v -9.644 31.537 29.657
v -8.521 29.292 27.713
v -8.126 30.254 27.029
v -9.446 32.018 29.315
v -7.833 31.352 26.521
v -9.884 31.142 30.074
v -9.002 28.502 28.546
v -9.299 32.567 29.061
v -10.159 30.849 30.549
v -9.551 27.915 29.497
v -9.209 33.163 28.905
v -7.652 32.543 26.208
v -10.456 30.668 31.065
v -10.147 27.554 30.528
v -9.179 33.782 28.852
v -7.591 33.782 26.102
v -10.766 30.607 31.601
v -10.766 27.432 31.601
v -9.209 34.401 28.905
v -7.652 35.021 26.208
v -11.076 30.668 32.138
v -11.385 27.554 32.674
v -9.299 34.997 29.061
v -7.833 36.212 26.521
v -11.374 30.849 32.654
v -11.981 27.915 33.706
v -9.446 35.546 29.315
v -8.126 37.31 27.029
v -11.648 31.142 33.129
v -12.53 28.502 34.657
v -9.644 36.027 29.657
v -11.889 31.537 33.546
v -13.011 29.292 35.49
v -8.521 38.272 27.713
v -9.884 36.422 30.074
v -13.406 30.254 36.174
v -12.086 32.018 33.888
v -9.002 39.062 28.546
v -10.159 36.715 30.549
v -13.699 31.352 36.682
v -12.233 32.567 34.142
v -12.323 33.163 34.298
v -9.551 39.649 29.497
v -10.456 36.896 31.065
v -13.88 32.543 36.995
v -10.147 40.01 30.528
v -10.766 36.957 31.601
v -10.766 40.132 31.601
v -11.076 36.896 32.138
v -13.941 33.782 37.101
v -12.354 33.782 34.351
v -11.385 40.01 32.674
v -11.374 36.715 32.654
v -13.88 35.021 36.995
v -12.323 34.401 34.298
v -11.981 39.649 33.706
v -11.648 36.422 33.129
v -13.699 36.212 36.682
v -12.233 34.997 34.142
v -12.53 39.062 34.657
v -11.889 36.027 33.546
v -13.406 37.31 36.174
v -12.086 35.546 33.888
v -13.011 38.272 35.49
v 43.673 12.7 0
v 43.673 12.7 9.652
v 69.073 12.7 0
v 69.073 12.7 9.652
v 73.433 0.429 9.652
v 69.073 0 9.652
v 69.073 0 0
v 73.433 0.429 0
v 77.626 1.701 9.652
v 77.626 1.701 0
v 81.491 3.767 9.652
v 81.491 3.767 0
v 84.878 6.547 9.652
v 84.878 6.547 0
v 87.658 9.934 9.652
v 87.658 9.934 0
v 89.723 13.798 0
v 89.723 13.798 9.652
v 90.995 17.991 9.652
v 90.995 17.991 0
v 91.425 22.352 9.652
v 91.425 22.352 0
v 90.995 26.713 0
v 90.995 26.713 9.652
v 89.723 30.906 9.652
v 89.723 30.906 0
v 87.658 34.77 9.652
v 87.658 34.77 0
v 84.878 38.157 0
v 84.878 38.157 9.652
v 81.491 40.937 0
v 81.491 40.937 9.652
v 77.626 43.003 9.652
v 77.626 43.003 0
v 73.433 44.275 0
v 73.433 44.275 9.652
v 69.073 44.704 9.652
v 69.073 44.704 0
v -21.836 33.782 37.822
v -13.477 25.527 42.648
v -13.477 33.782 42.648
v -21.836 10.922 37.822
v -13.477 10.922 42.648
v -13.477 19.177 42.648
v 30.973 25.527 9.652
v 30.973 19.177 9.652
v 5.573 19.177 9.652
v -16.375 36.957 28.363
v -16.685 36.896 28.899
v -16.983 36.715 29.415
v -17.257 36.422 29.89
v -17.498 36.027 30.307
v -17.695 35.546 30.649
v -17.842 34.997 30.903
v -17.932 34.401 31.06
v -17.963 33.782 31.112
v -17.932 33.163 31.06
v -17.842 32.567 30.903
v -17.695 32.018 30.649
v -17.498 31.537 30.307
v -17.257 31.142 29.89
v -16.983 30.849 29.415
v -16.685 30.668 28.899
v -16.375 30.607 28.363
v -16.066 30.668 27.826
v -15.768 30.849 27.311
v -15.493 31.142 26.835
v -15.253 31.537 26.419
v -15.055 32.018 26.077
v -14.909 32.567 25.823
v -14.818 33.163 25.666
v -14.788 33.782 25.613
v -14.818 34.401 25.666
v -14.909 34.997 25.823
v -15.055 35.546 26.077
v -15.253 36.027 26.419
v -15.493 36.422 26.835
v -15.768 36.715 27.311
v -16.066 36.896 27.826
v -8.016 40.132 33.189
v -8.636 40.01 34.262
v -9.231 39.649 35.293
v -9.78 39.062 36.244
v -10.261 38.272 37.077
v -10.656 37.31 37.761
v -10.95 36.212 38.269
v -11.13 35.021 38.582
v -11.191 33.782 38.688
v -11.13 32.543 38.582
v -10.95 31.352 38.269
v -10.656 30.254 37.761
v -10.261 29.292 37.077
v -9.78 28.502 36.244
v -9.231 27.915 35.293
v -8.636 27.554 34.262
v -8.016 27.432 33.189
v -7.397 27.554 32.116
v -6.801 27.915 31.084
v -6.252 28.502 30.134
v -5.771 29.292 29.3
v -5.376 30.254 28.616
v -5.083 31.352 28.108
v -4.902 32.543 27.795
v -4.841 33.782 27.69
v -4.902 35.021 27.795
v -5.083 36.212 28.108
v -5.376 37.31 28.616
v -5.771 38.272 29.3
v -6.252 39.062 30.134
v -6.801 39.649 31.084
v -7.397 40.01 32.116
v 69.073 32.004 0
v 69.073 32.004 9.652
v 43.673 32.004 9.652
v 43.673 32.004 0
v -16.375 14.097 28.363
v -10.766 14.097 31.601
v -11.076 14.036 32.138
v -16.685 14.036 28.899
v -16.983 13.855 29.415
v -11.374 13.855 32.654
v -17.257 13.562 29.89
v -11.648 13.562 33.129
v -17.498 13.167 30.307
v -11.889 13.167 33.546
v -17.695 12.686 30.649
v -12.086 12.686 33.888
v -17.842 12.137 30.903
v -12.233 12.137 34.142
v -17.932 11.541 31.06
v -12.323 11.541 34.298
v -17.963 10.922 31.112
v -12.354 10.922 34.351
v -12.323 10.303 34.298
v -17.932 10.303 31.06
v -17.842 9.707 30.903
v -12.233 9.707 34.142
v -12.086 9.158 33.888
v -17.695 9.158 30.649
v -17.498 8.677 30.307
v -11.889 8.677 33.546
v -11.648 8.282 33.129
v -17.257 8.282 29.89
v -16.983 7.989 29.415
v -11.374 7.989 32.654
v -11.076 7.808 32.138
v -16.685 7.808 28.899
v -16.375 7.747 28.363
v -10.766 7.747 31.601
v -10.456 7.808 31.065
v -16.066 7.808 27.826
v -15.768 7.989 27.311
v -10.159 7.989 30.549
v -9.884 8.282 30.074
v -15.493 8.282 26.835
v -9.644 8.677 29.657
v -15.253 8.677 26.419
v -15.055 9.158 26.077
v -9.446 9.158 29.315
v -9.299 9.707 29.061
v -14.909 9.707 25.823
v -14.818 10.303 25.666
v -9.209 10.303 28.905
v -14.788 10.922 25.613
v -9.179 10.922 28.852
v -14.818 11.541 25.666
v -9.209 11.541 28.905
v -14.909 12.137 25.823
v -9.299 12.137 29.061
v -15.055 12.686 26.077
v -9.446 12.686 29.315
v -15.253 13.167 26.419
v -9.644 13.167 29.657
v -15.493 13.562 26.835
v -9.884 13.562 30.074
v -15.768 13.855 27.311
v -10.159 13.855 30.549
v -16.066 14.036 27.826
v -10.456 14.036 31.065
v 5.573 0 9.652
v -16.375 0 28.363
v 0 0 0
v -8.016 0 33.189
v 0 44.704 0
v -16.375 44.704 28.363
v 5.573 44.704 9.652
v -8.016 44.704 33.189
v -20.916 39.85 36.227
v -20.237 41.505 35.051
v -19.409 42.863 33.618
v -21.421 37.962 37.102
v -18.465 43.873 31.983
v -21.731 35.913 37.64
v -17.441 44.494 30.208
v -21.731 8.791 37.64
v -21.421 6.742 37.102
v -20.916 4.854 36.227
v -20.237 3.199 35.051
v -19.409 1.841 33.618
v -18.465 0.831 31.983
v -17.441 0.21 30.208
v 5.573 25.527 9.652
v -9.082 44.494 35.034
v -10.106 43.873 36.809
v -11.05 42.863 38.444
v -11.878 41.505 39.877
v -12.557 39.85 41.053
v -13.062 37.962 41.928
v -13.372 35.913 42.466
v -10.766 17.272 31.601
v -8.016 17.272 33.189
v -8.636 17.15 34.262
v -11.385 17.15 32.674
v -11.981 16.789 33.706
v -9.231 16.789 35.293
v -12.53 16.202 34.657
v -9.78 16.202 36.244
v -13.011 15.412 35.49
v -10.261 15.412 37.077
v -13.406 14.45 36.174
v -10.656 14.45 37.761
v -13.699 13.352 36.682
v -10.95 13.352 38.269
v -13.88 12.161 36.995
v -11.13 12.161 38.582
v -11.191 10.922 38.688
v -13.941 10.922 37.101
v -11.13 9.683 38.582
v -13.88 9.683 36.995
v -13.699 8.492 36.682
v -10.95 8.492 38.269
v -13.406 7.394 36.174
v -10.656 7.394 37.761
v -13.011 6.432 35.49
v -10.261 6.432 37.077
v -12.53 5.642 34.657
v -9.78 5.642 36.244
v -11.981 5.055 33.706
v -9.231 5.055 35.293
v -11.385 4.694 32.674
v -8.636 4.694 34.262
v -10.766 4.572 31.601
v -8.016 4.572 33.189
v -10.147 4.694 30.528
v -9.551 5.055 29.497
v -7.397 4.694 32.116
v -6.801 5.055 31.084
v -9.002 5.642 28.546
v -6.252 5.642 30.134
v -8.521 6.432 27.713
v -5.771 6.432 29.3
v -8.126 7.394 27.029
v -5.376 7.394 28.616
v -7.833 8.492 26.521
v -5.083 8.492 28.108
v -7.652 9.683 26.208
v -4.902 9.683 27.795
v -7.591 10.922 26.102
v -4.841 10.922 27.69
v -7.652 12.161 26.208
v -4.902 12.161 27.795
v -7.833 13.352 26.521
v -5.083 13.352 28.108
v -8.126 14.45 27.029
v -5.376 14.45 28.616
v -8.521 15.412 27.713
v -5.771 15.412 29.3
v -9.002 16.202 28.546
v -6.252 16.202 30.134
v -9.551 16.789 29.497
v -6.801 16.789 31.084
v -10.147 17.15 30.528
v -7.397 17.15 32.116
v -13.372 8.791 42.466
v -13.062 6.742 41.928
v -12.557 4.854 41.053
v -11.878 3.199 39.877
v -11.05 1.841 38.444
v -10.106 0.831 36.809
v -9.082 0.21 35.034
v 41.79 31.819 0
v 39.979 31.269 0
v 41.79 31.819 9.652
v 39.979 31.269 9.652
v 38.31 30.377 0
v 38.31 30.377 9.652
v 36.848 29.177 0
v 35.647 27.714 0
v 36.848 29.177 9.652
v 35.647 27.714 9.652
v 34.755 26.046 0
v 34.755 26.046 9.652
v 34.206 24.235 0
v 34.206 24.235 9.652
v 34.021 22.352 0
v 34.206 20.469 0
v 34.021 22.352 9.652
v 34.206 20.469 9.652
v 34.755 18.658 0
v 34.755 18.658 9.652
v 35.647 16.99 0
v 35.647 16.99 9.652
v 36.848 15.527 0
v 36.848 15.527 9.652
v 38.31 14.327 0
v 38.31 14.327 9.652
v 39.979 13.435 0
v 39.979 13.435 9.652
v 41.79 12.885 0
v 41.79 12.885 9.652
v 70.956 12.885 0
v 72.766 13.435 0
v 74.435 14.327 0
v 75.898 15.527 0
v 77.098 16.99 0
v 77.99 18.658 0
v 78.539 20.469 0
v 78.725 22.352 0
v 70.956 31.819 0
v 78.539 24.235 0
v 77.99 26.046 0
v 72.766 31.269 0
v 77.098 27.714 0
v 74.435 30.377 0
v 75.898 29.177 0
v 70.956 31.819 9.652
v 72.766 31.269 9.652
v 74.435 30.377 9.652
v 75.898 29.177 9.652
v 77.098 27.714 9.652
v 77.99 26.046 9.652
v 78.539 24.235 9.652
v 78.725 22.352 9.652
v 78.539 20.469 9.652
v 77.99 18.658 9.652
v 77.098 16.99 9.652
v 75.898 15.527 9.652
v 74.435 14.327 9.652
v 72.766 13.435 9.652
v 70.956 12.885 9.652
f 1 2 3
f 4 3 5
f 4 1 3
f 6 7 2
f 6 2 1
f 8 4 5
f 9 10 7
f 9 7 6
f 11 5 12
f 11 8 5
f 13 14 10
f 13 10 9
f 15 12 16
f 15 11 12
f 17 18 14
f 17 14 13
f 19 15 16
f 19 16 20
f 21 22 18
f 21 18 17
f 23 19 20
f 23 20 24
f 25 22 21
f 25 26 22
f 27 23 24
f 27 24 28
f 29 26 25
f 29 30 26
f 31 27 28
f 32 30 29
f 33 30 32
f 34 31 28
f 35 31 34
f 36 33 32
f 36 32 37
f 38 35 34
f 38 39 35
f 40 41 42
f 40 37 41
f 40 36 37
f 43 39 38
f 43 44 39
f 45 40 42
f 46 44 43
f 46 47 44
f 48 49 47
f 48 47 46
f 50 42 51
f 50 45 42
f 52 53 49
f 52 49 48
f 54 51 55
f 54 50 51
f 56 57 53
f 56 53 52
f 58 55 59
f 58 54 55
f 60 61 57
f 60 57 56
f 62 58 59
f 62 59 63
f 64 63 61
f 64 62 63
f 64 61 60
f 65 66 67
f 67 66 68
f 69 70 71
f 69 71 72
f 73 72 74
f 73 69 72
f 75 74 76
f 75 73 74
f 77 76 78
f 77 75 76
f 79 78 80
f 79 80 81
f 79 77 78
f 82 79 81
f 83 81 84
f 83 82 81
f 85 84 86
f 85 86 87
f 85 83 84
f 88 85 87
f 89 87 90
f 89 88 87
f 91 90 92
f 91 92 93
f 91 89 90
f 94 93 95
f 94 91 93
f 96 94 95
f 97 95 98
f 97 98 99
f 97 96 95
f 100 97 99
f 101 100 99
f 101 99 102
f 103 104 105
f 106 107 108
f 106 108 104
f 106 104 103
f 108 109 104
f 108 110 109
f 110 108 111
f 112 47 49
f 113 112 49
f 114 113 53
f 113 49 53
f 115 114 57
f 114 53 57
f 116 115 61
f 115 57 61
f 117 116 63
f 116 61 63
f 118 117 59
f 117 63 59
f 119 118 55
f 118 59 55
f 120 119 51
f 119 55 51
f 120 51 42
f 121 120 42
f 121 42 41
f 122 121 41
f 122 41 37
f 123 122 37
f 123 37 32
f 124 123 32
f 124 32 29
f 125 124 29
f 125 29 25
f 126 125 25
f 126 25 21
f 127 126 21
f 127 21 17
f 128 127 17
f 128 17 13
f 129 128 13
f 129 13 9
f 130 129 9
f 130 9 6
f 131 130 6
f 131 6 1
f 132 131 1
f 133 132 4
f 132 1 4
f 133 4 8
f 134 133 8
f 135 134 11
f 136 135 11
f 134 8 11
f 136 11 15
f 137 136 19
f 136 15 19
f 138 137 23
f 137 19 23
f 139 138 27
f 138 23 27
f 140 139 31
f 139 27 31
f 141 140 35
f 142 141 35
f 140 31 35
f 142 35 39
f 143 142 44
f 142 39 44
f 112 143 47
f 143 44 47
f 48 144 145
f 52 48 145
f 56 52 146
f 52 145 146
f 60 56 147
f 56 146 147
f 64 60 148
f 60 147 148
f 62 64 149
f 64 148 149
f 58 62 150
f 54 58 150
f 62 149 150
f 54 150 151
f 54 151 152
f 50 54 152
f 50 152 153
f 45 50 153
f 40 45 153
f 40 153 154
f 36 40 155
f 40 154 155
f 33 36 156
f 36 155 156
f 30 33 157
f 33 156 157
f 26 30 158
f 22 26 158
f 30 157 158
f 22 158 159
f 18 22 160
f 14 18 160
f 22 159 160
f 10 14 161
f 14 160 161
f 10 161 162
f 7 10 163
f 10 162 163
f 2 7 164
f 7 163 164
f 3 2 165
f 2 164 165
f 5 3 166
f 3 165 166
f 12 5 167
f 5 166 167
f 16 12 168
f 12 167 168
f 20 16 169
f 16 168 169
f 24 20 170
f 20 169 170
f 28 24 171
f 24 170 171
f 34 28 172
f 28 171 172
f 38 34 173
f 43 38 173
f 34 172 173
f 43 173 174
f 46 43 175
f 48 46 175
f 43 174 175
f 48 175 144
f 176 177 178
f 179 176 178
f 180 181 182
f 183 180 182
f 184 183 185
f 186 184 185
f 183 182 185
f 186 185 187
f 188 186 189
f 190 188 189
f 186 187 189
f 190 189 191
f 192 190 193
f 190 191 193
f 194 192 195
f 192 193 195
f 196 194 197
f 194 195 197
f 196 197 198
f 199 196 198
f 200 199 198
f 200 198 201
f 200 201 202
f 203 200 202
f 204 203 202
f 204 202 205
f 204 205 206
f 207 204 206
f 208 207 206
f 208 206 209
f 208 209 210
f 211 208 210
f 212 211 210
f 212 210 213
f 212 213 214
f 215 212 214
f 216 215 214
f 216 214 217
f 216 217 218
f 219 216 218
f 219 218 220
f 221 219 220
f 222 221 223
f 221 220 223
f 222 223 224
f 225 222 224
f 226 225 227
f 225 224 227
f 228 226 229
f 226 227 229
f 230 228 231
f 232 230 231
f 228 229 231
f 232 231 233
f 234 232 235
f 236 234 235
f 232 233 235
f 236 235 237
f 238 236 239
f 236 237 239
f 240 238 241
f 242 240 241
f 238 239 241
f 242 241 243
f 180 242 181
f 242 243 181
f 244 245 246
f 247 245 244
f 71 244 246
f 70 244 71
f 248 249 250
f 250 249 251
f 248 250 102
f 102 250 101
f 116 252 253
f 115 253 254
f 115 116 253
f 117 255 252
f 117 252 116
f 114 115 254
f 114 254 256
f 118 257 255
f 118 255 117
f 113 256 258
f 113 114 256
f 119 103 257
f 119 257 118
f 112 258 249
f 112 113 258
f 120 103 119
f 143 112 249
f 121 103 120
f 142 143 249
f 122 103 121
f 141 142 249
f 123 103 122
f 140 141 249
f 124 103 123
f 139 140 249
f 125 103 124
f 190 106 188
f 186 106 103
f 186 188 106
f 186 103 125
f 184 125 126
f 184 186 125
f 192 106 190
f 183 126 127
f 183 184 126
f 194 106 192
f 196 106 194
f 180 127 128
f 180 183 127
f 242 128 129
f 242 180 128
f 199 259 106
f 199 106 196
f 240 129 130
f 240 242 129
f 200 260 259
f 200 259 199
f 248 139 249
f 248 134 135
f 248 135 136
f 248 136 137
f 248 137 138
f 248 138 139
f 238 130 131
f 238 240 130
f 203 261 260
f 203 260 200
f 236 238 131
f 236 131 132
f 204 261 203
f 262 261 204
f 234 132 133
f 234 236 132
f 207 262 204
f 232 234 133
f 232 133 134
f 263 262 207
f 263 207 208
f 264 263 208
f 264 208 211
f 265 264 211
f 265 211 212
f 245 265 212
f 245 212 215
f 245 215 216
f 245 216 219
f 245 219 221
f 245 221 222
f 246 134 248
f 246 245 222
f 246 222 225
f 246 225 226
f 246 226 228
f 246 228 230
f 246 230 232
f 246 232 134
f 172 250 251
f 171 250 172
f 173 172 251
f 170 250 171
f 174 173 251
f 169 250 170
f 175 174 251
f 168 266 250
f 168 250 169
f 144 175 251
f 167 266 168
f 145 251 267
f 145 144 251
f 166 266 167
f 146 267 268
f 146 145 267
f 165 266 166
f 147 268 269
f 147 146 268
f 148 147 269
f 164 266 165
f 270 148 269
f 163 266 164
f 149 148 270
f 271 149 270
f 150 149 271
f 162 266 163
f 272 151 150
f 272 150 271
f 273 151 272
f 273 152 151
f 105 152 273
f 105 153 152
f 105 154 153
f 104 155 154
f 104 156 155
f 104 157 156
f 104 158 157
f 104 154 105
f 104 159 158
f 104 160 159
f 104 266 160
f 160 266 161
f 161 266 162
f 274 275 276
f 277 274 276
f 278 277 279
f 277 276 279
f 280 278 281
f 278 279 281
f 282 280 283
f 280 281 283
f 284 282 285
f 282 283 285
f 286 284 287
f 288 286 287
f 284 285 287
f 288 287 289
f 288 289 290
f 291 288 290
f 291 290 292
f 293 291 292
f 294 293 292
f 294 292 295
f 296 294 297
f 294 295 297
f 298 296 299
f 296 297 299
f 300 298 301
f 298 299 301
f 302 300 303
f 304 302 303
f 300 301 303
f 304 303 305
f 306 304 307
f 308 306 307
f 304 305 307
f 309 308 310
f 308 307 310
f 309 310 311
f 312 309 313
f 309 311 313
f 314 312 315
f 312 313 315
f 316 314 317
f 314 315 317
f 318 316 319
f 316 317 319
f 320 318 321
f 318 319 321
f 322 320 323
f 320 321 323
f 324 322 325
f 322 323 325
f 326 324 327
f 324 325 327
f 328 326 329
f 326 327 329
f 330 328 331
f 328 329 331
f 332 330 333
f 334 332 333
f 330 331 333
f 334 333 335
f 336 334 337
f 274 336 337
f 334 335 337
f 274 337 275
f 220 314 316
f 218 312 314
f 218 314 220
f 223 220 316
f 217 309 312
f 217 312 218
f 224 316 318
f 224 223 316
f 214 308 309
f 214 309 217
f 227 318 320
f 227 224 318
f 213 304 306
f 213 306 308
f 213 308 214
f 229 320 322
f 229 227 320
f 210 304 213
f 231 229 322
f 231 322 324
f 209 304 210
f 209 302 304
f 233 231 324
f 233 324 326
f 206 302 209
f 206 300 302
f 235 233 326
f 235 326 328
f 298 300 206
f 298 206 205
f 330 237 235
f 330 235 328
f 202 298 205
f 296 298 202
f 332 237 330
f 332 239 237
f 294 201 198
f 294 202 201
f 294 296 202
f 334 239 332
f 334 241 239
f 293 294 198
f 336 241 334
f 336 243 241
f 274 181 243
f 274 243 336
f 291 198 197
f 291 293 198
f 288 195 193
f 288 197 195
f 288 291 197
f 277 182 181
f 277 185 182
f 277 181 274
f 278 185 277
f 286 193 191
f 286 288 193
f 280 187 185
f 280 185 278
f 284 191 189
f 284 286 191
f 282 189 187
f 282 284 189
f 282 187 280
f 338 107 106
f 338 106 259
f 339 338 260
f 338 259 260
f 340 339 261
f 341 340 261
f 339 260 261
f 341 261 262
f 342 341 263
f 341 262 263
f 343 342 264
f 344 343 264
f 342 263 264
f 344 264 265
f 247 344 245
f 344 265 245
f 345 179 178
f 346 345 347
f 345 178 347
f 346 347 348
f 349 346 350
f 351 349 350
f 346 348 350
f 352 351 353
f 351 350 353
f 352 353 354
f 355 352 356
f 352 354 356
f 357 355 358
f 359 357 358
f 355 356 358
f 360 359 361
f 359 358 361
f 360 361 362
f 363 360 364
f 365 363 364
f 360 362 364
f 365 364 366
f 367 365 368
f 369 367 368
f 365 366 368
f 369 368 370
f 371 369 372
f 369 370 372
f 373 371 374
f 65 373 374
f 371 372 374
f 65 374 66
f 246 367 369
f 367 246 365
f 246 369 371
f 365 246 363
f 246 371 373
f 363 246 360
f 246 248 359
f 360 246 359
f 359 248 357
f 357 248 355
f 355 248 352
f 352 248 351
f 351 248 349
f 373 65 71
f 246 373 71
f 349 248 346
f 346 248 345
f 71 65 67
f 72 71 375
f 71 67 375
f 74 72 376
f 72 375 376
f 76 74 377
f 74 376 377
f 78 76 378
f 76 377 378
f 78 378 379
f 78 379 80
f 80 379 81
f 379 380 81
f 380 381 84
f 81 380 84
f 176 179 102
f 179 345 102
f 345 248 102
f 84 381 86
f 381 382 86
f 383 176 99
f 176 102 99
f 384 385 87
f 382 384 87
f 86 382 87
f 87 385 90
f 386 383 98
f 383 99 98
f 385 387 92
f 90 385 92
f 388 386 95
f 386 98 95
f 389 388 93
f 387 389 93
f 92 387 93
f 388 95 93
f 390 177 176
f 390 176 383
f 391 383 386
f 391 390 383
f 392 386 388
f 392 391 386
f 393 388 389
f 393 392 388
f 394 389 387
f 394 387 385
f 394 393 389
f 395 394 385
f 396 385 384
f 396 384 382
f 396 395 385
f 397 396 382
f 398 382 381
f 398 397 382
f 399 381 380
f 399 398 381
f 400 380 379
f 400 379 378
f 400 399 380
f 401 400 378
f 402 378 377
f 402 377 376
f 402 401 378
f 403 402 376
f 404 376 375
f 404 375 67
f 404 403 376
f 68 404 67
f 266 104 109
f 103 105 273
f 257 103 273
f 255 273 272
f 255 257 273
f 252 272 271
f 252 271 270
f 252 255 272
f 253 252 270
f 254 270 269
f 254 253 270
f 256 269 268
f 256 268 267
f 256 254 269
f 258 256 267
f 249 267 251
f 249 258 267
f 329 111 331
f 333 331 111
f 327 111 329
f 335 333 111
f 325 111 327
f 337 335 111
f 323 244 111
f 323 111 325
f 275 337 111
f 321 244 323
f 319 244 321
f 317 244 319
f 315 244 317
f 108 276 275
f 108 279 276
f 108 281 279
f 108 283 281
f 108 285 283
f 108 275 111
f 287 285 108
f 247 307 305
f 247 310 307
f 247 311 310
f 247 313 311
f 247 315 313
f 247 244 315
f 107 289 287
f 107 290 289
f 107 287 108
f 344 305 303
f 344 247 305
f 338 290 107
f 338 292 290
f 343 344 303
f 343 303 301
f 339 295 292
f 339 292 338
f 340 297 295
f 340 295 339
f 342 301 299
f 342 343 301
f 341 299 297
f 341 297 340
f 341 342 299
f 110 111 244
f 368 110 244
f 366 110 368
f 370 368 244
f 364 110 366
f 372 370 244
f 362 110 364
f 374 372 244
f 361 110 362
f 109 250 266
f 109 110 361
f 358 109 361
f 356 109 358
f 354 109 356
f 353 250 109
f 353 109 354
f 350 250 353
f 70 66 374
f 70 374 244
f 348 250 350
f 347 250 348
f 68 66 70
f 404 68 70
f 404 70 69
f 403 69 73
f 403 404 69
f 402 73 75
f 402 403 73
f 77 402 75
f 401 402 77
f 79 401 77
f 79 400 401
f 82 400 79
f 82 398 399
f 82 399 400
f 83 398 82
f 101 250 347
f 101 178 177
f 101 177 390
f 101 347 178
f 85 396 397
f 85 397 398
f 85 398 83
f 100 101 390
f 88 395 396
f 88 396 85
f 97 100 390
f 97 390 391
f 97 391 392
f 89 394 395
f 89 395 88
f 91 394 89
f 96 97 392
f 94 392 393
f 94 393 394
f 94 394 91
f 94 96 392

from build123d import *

# Parameters (mm, degrees)
F1_DEPTH  = 44.704
F3_DEPTH  = 9.652
F4_DEPTH  = 9.652
F8_DEPTH  = 3.175
F9_R      = 3.175
F10_DEPTH = 9.652
F9_R_2    = 6.35
F11_DEPTH = 3.175
F12_R     = 10.922


with BuildPart() as f1:
    # F0 (on Front) → F1 (new body)
    with BuildSketch(Plane.XZ):
        Polygon((-21.8362923991, 37.8215678842), (0, 0), (69.0725847982, 0), (69.0725847982, 9.652), (5.5725847982, 9.652), (-13.4774152018, 42.6475678842), align=None)
    extrude(amount=-F1_DEPTH)

    # F2 (on face) → F3 (join, through all)
    with BuildSketch(Plane.XY.offset(9.652)):
        with BuildLine():
            Line((69.0725847982, 12.7), (69.0725847982, 0))
            ThreePointArc((69.0725847982, 0), (91.4245847982, 22.352), (69.0725847982, 44.704))
            Line((69.0725847982, 44.704), (69.0725847982, 32.004))
            ThreePointArc((69.0725847982, 32.004), (78.7245847982, 22.352), (69.0725847982, 12.7))
        make_face()
    extrude(amount=-F3_DEPTH)

    # F2 (on face) → F4 (cut, through all)
    with BuildSketch(Plane.XY.offset(9.652)):
        with BuildLine():
            Line((43.6725847982, 12.7), (69.0725847982, 12.7))
            Line((69.0725847982, 12.7), (69.0725847982, 32.004))
            Line((69.0725847982, 32.004), (43.6725847982, 32.004))
            ThreePointArc((43.6725847982, 32.004), (34.0205847982, 22.352), (43.6725847982, 12.7))
        make_face()
    extrude(amount=-F4_DEPTH, mode=Mode.SUBTRACT)

    # F7 (on offset) → F8 (join, symmetric)
    with BuildSketch(Plane.XZ.offset(-22.352)):
        Polygon((30.9725847982, 9.652), (-13.4774152018, 42.6475678842), (5.5725847982, 9.652), align=None)
    extrude(amount=F8_DEPTH, both=True)

    # F9 (on face) → F10 (cut, through all)
    with BuildSketch(Plane(origin=(8.3588771973, 0, 4.826), x_dir=(0, 1, 0), z_dir=(0.8660254038, 0, 0.5))):
        with Locations((10.922, 32.7505847982)):
            Circle(F9_R)
        with BuildLine():
            ThreePointArc((30.607, 32.7505847982), (33.782, 29.5755847982), (36.957, 32.7505847982))
            Line((36.957, 32.7505847982), (33.782, 32.7505847982))
            Line((33.782, 32.7505847982), (30.607, 32.7505847982))
        make_face()
        with BuildLine():
            Line((33.782, 32.7505847982), (36.957, 32.7505847982))
            ThreePointArc((36.957, 32.7505847982), (33.782, 35.9255847982), (30.607, 32.7505847982))
            Line((30.607, 32.7505847982), (33.782, 32.7505847982))
        make_face()
    extrude(amount=-F10_DEPTH, mode=Mode.SUBTRACT)

    # F9 (on face) → F11 (cut)
    with BuildSketch(Plane(origin=(8.3588771973, 0, 4.826), x_dir=(0, 1, 0), z_dir=(0.8660254038, 0, 0.5))):
        with Locations((10.922, 32.7505847982)):
            Circle(F9_R_2)
        with Locations((10.922, 32.7505847982)):
            Circle(F9_R, mode=Mode.SUBTRACT)
        with BuildLine():
            ThreePointArc((27.432, 32.7505847982), (33.782, 26.4005847982), (40.132, 32.7505847982))
            Line((40.132, 32.7505847982), (36.957, 32.7505847982))
            ThreePointArc((36.957, 32.7505847982), (33.782, 29.5755847982), (30.607, 32.7505847982))
            Line((30.607, 32.7505847982), (27.432, 32.7505847982))
        make_face()
        with BuildLine():
            Line((36.957, 32.7505847982), (40.132, 32.7505847982))
            ThreePointArc((40.132, 32.7505847982), (33.782, 39.1005847982), (27.432, 32.7505847982))
            Line((27.432, 32.7505847982), (30.607, 32.7505847982))
            ThreePointArc((30.607, 32.7505847982), (33.782, 35.9255847982), (36.957, 32.7505847982))
        make_face()
    extrude(amount=-F11_DEPTH, mode=Mode.SUBTRACT)

    # F12
    f12_edges = [f1.edges().sort_by_distance(p)[0] for p in [
        (-17.656854, 0, 40.234568),
        (-17.656854, 44.704, 40.234568),
    ]]
    fillet(f12_edges, radius=F12_R)


solid = f1.part
